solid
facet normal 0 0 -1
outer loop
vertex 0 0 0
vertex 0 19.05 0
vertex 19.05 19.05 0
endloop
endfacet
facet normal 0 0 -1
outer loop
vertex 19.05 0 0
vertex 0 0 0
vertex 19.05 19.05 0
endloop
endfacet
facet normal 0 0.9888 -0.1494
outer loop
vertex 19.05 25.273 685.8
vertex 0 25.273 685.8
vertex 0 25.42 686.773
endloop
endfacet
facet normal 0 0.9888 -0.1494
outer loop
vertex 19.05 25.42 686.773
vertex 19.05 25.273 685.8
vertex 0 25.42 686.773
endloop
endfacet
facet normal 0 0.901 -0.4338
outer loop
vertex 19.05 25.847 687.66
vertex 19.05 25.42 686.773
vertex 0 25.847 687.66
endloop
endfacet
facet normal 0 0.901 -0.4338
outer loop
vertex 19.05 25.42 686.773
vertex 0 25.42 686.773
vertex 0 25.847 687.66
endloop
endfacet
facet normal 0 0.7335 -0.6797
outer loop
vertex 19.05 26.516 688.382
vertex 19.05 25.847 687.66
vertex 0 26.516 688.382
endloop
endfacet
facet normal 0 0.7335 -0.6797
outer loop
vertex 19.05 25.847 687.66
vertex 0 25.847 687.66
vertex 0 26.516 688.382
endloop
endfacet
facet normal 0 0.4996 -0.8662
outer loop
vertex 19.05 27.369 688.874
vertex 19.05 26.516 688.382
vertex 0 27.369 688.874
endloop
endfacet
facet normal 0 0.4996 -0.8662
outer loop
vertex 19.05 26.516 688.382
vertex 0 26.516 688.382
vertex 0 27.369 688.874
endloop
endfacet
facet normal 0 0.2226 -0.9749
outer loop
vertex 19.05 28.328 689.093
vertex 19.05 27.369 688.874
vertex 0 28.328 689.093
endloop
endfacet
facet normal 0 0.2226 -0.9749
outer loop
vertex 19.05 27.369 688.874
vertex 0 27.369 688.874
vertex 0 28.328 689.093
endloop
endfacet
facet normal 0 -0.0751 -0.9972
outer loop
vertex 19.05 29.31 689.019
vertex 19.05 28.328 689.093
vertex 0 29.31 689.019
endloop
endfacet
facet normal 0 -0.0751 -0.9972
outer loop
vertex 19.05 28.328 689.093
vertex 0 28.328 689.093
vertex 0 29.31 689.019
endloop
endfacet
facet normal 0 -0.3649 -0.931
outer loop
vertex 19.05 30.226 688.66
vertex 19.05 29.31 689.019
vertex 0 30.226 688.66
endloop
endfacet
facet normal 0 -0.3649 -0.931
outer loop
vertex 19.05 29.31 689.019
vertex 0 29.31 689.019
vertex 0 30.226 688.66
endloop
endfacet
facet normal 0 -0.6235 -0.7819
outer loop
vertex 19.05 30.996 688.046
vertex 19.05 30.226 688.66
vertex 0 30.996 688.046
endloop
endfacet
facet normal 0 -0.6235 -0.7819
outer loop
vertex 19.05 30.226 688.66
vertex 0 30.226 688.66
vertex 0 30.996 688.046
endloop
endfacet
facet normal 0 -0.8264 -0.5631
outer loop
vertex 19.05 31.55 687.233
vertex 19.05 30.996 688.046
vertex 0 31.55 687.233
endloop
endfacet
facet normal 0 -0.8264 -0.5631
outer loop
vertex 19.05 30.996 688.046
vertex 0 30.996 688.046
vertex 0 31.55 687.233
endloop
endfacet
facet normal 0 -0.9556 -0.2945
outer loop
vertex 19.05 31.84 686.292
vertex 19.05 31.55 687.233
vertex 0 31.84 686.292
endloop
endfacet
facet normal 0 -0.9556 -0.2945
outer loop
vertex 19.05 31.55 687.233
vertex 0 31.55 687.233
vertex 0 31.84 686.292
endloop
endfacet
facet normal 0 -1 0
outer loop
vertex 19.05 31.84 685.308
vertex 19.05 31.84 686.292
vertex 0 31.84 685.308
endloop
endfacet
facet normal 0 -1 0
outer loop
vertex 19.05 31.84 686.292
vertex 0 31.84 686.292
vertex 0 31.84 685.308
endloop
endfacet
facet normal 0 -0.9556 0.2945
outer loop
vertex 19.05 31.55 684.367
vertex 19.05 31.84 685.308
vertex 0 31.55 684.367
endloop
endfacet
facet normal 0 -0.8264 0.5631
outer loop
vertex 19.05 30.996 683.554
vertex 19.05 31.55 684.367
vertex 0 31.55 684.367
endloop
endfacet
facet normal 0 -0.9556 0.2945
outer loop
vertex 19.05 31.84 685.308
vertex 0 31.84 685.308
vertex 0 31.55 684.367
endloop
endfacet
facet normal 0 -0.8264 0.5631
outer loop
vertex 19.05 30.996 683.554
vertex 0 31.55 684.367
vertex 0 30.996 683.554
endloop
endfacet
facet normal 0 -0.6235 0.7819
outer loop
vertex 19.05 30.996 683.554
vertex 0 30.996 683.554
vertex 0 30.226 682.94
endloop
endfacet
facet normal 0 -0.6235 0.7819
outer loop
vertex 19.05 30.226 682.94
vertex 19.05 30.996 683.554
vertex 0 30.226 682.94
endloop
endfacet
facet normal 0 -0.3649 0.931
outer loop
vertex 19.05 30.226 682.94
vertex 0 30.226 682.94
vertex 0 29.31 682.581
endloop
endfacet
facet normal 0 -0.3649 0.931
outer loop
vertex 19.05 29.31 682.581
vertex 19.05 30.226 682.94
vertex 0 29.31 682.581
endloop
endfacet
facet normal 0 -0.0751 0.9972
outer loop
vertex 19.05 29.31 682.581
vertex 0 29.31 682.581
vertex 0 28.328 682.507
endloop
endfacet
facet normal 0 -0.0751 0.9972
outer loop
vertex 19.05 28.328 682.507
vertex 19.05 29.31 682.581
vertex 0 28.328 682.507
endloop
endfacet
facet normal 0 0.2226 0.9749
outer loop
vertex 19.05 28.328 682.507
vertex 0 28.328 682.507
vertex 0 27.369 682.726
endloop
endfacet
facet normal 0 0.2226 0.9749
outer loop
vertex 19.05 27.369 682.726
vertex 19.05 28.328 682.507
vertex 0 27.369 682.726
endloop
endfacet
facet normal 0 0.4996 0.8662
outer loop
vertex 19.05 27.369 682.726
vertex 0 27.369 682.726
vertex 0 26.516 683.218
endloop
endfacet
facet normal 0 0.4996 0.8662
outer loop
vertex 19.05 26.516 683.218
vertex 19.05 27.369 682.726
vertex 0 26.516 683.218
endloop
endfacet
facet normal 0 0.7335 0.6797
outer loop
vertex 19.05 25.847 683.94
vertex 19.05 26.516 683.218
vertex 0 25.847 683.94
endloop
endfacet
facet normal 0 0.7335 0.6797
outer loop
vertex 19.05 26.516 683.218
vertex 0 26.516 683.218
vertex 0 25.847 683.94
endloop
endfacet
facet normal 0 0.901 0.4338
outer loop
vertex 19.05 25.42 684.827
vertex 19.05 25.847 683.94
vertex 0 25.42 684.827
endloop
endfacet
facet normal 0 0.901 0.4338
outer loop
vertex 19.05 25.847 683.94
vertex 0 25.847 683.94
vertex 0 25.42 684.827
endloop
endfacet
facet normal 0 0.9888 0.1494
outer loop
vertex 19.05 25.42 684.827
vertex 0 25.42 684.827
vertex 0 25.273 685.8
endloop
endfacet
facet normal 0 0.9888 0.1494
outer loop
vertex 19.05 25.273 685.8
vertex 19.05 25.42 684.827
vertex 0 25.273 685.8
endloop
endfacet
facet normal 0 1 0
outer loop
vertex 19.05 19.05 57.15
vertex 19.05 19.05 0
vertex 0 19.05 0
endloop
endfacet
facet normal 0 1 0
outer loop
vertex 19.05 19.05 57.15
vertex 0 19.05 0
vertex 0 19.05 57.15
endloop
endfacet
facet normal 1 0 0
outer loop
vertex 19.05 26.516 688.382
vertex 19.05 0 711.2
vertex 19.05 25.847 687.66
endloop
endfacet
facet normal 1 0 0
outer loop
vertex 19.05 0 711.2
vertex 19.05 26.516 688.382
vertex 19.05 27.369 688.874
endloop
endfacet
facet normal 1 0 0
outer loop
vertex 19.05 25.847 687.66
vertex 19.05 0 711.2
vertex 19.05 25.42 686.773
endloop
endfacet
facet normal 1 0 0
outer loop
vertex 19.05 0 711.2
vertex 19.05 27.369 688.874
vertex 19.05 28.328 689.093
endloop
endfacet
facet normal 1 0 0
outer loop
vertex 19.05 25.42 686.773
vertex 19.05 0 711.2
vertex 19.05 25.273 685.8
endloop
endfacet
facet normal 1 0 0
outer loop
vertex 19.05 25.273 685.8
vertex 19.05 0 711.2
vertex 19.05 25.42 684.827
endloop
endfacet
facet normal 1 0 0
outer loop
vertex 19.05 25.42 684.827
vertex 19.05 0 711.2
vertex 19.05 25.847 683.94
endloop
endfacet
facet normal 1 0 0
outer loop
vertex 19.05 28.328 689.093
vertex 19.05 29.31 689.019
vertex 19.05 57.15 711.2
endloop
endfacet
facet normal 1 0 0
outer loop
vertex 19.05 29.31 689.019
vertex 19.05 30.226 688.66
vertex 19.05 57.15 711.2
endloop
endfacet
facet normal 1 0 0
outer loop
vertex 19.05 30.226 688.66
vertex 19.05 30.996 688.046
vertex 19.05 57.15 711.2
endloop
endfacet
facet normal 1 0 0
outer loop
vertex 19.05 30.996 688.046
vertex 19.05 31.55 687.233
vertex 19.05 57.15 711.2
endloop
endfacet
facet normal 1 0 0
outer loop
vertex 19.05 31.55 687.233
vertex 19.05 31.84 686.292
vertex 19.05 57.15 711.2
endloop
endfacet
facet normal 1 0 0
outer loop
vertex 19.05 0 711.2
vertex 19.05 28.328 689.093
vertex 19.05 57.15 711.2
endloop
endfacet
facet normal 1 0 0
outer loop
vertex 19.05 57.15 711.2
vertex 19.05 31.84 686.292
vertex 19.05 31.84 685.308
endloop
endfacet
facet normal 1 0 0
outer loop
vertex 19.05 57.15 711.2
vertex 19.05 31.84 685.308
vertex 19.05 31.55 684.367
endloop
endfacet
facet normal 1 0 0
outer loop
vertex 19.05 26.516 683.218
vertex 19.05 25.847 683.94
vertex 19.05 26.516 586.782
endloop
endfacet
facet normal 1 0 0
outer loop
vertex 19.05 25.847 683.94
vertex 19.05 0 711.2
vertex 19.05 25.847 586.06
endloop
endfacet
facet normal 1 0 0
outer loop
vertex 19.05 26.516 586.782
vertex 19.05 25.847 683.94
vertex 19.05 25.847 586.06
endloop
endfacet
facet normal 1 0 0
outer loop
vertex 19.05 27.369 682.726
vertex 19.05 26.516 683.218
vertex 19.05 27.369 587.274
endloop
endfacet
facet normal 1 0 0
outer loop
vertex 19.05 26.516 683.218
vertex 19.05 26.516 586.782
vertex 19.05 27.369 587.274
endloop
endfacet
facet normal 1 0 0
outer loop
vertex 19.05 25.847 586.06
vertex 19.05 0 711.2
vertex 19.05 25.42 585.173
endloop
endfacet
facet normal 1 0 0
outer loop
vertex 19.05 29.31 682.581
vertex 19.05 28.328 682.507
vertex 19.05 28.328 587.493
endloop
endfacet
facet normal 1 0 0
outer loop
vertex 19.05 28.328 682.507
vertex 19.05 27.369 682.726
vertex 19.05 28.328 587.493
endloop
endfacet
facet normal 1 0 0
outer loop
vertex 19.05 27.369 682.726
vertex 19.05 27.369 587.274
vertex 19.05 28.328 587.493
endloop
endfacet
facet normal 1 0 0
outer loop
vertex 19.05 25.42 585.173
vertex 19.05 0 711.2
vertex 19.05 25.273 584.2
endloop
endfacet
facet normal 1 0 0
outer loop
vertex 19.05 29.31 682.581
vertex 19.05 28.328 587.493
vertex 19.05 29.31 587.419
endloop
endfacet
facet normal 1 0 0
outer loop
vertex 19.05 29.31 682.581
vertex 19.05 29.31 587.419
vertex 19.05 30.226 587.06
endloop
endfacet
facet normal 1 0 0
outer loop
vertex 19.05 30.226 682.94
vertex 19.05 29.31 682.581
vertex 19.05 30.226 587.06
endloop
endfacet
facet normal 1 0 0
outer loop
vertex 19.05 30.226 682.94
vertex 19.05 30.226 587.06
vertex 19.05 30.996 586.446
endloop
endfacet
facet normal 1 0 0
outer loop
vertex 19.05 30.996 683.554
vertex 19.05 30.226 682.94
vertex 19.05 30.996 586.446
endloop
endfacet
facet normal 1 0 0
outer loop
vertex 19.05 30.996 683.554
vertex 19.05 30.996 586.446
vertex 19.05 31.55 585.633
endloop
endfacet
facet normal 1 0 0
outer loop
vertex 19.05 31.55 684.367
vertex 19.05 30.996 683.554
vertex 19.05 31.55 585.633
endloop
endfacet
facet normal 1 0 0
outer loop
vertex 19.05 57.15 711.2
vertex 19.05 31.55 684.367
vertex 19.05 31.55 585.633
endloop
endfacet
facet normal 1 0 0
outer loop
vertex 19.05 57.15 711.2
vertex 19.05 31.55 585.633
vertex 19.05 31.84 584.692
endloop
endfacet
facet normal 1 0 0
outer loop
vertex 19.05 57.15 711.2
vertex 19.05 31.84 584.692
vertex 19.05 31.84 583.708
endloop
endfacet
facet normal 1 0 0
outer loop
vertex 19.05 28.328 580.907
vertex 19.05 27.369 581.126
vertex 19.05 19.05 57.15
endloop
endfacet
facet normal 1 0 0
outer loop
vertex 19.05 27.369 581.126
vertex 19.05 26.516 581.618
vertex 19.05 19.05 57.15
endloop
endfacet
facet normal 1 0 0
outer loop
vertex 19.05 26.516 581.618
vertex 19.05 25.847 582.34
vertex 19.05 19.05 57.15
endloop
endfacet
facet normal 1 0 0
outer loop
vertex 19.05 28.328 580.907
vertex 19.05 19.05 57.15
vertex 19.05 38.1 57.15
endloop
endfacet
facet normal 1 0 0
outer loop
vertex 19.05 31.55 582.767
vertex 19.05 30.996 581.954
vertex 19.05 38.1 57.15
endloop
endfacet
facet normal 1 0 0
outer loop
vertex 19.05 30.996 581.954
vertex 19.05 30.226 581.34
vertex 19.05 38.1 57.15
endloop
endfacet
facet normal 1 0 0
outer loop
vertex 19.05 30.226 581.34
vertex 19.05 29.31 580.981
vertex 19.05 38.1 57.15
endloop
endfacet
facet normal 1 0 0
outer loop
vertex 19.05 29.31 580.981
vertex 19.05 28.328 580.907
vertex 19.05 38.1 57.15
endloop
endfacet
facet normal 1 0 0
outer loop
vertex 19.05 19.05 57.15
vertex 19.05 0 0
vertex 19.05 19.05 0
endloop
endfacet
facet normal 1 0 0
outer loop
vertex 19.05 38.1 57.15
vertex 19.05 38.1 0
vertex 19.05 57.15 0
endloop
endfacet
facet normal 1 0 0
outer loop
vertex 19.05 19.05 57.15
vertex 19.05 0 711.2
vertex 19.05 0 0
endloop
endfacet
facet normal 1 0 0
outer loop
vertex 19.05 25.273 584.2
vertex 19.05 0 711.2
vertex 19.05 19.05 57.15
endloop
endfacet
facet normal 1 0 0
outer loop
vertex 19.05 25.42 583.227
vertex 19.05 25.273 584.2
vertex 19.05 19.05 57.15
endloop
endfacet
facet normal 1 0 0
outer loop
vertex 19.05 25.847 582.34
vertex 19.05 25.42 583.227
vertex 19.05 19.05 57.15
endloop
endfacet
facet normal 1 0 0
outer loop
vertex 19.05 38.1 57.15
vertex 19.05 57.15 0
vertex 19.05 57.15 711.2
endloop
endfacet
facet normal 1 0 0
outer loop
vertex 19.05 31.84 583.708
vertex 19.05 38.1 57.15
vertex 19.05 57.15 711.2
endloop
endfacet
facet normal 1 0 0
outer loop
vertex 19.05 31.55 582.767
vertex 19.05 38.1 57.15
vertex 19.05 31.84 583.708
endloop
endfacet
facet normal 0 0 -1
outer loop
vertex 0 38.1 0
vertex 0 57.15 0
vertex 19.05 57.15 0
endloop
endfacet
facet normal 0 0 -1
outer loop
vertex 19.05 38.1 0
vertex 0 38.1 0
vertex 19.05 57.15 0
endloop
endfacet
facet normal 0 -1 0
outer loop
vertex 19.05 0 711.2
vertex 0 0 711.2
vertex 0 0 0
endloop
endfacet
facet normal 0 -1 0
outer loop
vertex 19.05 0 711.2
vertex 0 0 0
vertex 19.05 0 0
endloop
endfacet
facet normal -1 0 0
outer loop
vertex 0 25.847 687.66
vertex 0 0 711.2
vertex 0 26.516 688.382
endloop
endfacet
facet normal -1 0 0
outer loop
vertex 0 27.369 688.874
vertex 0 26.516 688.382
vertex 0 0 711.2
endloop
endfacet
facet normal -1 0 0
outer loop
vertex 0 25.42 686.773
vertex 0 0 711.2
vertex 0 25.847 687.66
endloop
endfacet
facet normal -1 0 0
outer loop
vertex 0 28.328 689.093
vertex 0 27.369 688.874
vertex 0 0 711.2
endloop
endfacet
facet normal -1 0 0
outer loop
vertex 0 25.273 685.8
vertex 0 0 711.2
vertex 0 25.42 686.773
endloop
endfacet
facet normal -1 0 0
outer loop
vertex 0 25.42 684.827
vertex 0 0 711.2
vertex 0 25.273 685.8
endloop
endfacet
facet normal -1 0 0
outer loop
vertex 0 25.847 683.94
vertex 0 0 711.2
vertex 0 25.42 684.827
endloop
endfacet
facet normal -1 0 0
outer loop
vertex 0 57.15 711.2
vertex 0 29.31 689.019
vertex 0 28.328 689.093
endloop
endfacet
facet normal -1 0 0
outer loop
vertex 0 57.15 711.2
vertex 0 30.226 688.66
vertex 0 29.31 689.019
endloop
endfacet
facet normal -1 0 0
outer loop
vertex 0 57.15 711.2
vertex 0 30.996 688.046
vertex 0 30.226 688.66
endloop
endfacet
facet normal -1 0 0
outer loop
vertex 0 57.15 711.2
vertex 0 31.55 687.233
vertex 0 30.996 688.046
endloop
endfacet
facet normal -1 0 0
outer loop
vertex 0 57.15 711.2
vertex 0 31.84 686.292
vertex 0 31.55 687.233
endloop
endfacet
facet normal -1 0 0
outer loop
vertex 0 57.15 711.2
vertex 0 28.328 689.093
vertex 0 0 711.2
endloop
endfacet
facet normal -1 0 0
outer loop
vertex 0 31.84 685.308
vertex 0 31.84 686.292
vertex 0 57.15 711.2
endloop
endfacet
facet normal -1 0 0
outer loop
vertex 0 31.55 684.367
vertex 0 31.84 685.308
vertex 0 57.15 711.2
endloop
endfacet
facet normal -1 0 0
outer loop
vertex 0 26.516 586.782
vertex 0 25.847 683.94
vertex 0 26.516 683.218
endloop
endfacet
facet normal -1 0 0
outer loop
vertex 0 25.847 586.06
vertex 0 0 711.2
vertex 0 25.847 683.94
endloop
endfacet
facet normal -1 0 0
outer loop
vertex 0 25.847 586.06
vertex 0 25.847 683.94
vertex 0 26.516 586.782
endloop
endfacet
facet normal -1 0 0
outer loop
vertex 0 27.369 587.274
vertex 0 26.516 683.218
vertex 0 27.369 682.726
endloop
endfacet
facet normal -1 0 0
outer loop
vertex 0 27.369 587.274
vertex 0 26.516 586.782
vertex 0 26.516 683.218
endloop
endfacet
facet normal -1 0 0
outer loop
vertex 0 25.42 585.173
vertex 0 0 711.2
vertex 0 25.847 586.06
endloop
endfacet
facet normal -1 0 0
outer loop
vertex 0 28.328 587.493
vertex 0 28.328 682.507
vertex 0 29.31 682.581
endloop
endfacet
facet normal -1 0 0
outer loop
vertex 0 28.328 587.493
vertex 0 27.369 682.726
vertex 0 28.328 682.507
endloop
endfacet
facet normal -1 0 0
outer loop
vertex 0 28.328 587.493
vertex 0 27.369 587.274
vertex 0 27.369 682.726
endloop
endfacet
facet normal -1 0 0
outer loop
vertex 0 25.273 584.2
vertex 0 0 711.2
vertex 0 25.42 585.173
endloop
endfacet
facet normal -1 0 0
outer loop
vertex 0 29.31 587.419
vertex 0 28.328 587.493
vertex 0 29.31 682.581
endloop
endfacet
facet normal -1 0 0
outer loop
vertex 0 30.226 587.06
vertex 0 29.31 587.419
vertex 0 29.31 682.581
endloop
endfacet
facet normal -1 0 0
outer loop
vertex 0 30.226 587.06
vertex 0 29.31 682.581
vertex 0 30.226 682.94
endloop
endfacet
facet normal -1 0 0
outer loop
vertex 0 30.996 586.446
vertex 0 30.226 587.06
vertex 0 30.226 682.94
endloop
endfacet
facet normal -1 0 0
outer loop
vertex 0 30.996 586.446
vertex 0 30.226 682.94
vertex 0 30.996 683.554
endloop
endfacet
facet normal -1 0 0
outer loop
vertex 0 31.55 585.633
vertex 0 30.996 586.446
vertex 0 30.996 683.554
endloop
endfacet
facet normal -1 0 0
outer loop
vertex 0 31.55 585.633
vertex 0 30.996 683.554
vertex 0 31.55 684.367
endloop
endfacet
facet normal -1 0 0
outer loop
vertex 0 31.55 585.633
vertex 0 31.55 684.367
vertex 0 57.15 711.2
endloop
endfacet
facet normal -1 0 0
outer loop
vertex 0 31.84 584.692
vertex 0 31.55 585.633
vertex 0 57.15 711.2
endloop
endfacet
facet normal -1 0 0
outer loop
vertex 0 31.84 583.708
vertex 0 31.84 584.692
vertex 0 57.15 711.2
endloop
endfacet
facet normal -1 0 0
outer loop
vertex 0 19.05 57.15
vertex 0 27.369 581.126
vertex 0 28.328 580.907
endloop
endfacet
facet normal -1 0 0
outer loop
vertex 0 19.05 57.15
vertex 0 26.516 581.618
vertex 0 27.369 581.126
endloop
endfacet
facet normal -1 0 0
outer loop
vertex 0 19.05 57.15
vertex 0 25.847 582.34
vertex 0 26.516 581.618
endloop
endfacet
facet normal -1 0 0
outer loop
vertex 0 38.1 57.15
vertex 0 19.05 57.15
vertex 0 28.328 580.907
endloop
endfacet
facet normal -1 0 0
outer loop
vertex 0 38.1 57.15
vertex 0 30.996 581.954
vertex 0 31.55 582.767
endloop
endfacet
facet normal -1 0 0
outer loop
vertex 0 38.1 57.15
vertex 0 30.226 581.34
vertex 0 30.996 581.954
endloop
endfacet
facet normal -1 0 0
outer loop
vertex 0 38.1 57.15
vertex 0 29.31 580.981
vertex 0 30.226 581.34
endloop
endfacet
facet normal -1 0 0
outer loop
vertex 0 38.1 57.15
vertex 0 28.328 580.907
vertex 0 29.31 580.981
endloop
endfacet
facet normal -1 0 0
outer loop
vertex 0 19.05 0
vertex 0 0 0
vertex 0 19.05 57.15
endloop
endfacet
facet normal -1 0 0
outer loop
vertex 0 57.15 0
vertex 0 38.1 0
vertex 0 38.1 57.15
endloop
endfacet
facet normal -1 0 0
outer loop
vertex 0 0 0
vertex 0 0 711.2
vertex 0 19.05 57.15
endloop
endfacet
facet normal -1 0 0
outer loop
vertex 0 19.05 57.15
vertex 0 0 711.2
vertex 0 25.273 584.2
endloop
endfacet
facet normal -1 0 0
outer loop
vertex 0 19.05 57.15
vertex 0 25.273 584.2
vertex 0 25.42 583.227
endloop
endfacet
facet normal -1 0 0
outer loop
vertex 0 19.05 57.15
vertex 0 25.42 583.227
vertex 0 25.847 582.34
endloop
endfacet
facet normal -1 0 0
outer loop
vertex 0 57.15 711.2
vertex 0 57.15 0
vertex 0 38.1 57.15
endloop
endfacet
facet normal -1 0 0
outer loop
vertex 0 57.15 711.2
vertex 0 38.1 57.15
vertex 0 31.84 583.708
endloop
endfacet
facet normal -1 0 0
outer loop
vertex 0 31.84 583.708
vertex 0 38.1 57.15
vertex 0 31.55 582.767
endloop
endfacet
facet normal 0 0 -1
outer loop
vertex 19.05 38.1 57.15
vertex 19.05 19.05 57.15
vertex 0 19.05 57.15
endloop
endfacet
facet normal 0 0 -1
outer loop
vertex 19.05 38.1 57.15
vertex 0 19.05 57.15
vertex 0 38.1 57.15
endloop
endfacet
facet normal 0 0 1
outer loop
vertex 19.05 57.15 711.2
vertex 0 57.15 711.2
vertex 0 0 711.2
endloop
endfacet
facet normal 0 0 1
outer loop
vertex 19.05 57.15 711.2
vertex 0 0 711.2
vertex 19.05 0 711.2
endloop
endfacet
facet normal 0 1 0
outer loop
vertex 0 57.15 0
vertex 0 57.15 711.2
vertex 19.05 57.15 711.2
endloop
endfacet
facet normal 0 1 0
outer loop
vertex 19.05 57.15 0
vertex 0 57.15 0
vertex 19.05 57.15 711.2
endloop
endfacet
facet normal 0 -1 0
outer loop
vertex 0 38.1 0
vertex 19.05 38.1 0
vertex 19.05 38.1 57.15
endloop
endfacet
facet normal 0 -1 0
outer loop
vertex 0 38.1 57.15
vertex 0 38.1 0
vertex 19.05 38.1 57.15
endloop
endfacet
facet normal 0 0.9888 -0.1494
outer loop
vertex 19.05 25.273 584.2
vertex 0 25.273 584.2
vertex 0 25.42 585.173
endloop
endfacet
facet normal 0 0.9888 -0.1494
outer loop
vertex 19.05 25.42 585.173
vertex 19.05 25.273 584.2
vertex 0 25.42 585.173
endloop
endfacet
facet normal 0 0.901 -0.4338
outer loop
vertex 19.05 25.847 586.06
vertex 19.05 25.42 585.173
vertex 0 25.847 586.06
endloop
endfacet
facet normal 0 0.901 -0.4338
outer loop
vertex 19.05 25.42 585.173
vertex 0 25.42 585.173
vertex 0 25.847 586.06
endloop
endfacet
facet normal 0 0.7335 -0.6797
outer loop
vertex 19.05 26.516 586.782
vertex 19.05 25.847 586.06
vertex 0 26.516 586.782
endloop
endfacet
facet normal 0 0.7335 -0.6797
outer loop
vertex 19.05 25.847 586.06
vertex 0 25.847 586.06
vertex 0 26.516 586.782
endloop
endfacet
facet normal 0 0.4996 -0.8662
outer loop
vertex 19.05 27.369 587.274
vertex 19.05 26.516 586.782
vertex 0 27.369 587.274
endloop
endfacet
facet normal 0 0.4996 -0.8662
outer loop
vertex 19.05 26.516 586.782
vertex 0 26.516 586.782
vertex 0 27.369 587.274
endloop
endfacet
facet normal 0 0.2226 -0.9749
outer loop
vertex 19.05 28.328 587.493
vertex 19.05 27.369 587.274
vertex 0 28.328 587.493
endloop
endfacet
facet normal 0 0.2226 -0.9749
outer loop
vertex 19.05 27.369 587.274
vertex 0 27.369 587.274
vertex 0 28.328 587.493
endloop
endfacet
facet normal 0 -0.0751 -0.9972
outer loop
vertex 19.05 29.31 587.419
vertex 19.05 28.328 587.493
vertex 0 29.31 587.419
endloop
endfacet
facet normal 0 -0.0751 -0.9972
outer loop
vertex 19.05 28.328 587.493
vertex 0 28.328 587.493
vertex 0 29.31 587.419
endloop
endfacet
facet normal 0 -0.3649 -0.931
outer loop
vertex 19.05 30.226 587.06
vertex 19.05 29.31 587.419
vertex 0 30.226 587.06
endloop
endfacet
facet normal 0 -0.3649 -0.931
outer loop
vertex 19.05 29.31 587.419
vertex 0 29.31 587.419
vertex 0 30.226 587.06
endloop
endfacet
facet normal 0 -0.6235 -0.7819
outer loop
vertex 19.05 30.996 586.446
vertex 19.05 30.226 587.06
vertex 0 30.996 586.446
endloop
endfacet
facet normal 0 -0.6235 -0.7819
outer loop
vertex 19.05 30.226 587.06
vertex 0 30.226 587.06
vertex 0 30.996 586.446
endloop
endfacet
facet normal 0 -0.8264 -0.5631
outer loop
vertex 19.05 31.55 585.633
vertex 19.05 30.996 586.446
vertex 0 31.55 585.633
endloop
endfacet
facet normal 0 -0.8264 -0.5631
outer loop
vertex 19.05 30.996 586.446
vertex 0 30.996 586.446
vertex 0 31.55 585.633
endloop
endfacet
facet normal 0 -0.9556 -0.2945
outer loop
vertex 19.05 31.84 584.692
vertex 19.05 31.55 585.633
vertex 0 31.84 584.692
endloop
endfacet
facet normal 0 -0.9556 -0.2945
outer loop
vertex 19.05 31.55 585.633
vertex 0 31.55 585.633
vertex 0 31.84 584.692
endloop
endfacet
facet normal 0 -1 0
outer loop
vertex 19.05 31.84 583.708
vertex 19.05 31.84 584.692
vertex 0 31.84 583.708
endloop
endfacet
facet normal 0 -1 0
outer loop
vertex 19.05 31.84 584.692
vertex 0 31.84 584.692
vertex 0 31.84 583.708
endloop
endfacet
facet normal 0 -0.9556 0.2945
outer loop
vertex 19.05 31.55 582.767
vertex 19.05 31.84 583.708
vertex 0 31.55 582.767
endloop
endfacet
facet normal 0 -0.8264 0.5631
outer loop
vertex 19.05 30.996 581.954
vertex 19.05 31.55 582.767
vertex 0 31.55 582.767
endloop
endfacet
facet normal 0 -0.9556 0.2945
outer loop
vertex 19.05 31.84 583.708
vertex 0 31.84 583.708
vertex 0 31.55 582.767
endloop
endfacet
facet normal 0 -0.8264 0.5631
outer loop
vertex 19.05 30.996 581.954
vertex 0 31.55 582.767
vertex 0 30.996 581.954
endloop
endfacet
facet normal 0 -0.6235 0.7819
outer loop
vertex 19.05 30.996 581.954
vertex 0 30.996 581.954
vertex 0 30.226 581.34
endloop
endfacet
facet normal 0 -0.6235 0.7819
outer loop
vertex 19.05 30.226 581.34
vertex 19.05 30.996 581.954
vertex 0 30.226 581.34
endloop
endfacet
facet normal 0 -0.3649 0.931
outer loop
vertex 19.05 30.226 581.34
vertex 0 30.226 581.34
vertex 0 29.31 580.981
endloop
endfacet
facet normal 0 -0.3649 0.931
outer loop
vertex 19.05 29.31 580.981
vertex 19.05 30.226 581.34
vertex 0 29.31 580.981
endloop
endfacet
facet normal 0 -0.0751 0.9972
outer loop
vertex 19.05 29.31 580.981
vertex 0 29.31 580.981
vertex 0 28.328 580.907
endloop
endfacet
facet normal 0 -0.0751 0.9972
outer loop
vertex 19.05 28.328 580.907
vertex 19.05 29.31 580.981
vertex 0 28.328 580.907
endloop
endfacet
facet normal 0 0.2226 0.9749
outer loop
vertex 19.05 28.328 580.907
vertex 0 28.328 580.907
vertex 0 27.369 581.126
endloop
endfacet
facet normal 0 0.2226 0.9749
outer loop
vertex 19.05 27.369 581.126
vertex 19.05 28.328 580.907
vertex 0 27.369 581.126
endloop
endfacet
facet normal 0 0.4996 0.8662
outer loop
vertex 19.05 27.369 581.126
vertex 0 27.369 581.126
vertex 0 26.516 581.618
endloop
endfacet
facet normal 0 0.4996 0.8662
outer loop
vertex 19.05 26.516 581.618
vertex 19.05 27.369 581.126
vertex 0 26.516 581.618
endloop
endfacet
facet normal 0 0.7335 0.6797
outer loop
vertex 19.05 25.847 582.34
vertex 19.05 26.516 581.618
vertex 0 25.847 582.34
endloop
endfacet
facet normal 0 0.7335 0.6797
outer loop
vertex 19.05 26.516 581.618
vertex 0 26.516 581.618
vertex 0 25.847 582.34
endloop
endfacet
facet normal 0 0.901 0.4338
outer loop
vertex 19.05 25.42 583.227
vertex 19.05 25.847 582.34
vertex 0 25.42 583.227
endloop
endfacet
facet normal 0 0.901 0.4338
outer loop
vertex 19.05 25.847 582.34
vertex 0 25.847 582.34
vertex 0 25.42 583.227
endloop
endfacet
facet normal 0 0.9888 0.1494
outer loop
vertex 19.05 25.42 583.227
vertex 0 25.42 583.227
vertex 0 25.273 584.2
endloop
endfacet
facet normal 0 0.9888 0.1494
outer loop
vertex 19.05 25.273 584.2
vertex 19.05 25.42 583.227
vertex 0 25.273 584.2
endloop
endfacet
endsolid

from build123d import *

# Parameters (mm, degrees)
F0_W     = 19.05
F0_H     = 57.15
F1_DEPTH = 711.2
F2_W     = 19.05
F2_H     = 57.15
F3_DEPTH = 19.05
F4_R     = 3.302
F5_DEPTH = 19.05


with BuildPart() as f1:
    # F0 (on Top) → F1 (new body)
    with BuildSketch(Plane.XY):
        with Locations((9.525, 28.575)):
            Rectangle(F0_W, F0_H)
    extrude(amount=F1_DEPTH)

    # F2 (on face) → F3 (cut, through all)
    with BuildSketch(Plane.YZ.offset(19.05)):
        with Locations((28.575, 28.575)):
            Rectangle(F2_W, F2_H)
    extrude(amount=-F3_DEPTH, mode=Mode.SUBTRACT)

    # F4 (on face) → F5 (cut, through all)
    with BuildSketch(Plane(origin=(0, 0, 0), x_dir=(0, -1, 0), z_dir=(-1, 0, 0))):
        with Locations((-28.575, 685.8)):
            Circle(F4_R)
        with Locations((-28.575, 584.2)):
            Circle(F4_R)
    extrude(amount=-F5_DEPTH, mode=Mode.SUBTRACT)


solid = f1.part
